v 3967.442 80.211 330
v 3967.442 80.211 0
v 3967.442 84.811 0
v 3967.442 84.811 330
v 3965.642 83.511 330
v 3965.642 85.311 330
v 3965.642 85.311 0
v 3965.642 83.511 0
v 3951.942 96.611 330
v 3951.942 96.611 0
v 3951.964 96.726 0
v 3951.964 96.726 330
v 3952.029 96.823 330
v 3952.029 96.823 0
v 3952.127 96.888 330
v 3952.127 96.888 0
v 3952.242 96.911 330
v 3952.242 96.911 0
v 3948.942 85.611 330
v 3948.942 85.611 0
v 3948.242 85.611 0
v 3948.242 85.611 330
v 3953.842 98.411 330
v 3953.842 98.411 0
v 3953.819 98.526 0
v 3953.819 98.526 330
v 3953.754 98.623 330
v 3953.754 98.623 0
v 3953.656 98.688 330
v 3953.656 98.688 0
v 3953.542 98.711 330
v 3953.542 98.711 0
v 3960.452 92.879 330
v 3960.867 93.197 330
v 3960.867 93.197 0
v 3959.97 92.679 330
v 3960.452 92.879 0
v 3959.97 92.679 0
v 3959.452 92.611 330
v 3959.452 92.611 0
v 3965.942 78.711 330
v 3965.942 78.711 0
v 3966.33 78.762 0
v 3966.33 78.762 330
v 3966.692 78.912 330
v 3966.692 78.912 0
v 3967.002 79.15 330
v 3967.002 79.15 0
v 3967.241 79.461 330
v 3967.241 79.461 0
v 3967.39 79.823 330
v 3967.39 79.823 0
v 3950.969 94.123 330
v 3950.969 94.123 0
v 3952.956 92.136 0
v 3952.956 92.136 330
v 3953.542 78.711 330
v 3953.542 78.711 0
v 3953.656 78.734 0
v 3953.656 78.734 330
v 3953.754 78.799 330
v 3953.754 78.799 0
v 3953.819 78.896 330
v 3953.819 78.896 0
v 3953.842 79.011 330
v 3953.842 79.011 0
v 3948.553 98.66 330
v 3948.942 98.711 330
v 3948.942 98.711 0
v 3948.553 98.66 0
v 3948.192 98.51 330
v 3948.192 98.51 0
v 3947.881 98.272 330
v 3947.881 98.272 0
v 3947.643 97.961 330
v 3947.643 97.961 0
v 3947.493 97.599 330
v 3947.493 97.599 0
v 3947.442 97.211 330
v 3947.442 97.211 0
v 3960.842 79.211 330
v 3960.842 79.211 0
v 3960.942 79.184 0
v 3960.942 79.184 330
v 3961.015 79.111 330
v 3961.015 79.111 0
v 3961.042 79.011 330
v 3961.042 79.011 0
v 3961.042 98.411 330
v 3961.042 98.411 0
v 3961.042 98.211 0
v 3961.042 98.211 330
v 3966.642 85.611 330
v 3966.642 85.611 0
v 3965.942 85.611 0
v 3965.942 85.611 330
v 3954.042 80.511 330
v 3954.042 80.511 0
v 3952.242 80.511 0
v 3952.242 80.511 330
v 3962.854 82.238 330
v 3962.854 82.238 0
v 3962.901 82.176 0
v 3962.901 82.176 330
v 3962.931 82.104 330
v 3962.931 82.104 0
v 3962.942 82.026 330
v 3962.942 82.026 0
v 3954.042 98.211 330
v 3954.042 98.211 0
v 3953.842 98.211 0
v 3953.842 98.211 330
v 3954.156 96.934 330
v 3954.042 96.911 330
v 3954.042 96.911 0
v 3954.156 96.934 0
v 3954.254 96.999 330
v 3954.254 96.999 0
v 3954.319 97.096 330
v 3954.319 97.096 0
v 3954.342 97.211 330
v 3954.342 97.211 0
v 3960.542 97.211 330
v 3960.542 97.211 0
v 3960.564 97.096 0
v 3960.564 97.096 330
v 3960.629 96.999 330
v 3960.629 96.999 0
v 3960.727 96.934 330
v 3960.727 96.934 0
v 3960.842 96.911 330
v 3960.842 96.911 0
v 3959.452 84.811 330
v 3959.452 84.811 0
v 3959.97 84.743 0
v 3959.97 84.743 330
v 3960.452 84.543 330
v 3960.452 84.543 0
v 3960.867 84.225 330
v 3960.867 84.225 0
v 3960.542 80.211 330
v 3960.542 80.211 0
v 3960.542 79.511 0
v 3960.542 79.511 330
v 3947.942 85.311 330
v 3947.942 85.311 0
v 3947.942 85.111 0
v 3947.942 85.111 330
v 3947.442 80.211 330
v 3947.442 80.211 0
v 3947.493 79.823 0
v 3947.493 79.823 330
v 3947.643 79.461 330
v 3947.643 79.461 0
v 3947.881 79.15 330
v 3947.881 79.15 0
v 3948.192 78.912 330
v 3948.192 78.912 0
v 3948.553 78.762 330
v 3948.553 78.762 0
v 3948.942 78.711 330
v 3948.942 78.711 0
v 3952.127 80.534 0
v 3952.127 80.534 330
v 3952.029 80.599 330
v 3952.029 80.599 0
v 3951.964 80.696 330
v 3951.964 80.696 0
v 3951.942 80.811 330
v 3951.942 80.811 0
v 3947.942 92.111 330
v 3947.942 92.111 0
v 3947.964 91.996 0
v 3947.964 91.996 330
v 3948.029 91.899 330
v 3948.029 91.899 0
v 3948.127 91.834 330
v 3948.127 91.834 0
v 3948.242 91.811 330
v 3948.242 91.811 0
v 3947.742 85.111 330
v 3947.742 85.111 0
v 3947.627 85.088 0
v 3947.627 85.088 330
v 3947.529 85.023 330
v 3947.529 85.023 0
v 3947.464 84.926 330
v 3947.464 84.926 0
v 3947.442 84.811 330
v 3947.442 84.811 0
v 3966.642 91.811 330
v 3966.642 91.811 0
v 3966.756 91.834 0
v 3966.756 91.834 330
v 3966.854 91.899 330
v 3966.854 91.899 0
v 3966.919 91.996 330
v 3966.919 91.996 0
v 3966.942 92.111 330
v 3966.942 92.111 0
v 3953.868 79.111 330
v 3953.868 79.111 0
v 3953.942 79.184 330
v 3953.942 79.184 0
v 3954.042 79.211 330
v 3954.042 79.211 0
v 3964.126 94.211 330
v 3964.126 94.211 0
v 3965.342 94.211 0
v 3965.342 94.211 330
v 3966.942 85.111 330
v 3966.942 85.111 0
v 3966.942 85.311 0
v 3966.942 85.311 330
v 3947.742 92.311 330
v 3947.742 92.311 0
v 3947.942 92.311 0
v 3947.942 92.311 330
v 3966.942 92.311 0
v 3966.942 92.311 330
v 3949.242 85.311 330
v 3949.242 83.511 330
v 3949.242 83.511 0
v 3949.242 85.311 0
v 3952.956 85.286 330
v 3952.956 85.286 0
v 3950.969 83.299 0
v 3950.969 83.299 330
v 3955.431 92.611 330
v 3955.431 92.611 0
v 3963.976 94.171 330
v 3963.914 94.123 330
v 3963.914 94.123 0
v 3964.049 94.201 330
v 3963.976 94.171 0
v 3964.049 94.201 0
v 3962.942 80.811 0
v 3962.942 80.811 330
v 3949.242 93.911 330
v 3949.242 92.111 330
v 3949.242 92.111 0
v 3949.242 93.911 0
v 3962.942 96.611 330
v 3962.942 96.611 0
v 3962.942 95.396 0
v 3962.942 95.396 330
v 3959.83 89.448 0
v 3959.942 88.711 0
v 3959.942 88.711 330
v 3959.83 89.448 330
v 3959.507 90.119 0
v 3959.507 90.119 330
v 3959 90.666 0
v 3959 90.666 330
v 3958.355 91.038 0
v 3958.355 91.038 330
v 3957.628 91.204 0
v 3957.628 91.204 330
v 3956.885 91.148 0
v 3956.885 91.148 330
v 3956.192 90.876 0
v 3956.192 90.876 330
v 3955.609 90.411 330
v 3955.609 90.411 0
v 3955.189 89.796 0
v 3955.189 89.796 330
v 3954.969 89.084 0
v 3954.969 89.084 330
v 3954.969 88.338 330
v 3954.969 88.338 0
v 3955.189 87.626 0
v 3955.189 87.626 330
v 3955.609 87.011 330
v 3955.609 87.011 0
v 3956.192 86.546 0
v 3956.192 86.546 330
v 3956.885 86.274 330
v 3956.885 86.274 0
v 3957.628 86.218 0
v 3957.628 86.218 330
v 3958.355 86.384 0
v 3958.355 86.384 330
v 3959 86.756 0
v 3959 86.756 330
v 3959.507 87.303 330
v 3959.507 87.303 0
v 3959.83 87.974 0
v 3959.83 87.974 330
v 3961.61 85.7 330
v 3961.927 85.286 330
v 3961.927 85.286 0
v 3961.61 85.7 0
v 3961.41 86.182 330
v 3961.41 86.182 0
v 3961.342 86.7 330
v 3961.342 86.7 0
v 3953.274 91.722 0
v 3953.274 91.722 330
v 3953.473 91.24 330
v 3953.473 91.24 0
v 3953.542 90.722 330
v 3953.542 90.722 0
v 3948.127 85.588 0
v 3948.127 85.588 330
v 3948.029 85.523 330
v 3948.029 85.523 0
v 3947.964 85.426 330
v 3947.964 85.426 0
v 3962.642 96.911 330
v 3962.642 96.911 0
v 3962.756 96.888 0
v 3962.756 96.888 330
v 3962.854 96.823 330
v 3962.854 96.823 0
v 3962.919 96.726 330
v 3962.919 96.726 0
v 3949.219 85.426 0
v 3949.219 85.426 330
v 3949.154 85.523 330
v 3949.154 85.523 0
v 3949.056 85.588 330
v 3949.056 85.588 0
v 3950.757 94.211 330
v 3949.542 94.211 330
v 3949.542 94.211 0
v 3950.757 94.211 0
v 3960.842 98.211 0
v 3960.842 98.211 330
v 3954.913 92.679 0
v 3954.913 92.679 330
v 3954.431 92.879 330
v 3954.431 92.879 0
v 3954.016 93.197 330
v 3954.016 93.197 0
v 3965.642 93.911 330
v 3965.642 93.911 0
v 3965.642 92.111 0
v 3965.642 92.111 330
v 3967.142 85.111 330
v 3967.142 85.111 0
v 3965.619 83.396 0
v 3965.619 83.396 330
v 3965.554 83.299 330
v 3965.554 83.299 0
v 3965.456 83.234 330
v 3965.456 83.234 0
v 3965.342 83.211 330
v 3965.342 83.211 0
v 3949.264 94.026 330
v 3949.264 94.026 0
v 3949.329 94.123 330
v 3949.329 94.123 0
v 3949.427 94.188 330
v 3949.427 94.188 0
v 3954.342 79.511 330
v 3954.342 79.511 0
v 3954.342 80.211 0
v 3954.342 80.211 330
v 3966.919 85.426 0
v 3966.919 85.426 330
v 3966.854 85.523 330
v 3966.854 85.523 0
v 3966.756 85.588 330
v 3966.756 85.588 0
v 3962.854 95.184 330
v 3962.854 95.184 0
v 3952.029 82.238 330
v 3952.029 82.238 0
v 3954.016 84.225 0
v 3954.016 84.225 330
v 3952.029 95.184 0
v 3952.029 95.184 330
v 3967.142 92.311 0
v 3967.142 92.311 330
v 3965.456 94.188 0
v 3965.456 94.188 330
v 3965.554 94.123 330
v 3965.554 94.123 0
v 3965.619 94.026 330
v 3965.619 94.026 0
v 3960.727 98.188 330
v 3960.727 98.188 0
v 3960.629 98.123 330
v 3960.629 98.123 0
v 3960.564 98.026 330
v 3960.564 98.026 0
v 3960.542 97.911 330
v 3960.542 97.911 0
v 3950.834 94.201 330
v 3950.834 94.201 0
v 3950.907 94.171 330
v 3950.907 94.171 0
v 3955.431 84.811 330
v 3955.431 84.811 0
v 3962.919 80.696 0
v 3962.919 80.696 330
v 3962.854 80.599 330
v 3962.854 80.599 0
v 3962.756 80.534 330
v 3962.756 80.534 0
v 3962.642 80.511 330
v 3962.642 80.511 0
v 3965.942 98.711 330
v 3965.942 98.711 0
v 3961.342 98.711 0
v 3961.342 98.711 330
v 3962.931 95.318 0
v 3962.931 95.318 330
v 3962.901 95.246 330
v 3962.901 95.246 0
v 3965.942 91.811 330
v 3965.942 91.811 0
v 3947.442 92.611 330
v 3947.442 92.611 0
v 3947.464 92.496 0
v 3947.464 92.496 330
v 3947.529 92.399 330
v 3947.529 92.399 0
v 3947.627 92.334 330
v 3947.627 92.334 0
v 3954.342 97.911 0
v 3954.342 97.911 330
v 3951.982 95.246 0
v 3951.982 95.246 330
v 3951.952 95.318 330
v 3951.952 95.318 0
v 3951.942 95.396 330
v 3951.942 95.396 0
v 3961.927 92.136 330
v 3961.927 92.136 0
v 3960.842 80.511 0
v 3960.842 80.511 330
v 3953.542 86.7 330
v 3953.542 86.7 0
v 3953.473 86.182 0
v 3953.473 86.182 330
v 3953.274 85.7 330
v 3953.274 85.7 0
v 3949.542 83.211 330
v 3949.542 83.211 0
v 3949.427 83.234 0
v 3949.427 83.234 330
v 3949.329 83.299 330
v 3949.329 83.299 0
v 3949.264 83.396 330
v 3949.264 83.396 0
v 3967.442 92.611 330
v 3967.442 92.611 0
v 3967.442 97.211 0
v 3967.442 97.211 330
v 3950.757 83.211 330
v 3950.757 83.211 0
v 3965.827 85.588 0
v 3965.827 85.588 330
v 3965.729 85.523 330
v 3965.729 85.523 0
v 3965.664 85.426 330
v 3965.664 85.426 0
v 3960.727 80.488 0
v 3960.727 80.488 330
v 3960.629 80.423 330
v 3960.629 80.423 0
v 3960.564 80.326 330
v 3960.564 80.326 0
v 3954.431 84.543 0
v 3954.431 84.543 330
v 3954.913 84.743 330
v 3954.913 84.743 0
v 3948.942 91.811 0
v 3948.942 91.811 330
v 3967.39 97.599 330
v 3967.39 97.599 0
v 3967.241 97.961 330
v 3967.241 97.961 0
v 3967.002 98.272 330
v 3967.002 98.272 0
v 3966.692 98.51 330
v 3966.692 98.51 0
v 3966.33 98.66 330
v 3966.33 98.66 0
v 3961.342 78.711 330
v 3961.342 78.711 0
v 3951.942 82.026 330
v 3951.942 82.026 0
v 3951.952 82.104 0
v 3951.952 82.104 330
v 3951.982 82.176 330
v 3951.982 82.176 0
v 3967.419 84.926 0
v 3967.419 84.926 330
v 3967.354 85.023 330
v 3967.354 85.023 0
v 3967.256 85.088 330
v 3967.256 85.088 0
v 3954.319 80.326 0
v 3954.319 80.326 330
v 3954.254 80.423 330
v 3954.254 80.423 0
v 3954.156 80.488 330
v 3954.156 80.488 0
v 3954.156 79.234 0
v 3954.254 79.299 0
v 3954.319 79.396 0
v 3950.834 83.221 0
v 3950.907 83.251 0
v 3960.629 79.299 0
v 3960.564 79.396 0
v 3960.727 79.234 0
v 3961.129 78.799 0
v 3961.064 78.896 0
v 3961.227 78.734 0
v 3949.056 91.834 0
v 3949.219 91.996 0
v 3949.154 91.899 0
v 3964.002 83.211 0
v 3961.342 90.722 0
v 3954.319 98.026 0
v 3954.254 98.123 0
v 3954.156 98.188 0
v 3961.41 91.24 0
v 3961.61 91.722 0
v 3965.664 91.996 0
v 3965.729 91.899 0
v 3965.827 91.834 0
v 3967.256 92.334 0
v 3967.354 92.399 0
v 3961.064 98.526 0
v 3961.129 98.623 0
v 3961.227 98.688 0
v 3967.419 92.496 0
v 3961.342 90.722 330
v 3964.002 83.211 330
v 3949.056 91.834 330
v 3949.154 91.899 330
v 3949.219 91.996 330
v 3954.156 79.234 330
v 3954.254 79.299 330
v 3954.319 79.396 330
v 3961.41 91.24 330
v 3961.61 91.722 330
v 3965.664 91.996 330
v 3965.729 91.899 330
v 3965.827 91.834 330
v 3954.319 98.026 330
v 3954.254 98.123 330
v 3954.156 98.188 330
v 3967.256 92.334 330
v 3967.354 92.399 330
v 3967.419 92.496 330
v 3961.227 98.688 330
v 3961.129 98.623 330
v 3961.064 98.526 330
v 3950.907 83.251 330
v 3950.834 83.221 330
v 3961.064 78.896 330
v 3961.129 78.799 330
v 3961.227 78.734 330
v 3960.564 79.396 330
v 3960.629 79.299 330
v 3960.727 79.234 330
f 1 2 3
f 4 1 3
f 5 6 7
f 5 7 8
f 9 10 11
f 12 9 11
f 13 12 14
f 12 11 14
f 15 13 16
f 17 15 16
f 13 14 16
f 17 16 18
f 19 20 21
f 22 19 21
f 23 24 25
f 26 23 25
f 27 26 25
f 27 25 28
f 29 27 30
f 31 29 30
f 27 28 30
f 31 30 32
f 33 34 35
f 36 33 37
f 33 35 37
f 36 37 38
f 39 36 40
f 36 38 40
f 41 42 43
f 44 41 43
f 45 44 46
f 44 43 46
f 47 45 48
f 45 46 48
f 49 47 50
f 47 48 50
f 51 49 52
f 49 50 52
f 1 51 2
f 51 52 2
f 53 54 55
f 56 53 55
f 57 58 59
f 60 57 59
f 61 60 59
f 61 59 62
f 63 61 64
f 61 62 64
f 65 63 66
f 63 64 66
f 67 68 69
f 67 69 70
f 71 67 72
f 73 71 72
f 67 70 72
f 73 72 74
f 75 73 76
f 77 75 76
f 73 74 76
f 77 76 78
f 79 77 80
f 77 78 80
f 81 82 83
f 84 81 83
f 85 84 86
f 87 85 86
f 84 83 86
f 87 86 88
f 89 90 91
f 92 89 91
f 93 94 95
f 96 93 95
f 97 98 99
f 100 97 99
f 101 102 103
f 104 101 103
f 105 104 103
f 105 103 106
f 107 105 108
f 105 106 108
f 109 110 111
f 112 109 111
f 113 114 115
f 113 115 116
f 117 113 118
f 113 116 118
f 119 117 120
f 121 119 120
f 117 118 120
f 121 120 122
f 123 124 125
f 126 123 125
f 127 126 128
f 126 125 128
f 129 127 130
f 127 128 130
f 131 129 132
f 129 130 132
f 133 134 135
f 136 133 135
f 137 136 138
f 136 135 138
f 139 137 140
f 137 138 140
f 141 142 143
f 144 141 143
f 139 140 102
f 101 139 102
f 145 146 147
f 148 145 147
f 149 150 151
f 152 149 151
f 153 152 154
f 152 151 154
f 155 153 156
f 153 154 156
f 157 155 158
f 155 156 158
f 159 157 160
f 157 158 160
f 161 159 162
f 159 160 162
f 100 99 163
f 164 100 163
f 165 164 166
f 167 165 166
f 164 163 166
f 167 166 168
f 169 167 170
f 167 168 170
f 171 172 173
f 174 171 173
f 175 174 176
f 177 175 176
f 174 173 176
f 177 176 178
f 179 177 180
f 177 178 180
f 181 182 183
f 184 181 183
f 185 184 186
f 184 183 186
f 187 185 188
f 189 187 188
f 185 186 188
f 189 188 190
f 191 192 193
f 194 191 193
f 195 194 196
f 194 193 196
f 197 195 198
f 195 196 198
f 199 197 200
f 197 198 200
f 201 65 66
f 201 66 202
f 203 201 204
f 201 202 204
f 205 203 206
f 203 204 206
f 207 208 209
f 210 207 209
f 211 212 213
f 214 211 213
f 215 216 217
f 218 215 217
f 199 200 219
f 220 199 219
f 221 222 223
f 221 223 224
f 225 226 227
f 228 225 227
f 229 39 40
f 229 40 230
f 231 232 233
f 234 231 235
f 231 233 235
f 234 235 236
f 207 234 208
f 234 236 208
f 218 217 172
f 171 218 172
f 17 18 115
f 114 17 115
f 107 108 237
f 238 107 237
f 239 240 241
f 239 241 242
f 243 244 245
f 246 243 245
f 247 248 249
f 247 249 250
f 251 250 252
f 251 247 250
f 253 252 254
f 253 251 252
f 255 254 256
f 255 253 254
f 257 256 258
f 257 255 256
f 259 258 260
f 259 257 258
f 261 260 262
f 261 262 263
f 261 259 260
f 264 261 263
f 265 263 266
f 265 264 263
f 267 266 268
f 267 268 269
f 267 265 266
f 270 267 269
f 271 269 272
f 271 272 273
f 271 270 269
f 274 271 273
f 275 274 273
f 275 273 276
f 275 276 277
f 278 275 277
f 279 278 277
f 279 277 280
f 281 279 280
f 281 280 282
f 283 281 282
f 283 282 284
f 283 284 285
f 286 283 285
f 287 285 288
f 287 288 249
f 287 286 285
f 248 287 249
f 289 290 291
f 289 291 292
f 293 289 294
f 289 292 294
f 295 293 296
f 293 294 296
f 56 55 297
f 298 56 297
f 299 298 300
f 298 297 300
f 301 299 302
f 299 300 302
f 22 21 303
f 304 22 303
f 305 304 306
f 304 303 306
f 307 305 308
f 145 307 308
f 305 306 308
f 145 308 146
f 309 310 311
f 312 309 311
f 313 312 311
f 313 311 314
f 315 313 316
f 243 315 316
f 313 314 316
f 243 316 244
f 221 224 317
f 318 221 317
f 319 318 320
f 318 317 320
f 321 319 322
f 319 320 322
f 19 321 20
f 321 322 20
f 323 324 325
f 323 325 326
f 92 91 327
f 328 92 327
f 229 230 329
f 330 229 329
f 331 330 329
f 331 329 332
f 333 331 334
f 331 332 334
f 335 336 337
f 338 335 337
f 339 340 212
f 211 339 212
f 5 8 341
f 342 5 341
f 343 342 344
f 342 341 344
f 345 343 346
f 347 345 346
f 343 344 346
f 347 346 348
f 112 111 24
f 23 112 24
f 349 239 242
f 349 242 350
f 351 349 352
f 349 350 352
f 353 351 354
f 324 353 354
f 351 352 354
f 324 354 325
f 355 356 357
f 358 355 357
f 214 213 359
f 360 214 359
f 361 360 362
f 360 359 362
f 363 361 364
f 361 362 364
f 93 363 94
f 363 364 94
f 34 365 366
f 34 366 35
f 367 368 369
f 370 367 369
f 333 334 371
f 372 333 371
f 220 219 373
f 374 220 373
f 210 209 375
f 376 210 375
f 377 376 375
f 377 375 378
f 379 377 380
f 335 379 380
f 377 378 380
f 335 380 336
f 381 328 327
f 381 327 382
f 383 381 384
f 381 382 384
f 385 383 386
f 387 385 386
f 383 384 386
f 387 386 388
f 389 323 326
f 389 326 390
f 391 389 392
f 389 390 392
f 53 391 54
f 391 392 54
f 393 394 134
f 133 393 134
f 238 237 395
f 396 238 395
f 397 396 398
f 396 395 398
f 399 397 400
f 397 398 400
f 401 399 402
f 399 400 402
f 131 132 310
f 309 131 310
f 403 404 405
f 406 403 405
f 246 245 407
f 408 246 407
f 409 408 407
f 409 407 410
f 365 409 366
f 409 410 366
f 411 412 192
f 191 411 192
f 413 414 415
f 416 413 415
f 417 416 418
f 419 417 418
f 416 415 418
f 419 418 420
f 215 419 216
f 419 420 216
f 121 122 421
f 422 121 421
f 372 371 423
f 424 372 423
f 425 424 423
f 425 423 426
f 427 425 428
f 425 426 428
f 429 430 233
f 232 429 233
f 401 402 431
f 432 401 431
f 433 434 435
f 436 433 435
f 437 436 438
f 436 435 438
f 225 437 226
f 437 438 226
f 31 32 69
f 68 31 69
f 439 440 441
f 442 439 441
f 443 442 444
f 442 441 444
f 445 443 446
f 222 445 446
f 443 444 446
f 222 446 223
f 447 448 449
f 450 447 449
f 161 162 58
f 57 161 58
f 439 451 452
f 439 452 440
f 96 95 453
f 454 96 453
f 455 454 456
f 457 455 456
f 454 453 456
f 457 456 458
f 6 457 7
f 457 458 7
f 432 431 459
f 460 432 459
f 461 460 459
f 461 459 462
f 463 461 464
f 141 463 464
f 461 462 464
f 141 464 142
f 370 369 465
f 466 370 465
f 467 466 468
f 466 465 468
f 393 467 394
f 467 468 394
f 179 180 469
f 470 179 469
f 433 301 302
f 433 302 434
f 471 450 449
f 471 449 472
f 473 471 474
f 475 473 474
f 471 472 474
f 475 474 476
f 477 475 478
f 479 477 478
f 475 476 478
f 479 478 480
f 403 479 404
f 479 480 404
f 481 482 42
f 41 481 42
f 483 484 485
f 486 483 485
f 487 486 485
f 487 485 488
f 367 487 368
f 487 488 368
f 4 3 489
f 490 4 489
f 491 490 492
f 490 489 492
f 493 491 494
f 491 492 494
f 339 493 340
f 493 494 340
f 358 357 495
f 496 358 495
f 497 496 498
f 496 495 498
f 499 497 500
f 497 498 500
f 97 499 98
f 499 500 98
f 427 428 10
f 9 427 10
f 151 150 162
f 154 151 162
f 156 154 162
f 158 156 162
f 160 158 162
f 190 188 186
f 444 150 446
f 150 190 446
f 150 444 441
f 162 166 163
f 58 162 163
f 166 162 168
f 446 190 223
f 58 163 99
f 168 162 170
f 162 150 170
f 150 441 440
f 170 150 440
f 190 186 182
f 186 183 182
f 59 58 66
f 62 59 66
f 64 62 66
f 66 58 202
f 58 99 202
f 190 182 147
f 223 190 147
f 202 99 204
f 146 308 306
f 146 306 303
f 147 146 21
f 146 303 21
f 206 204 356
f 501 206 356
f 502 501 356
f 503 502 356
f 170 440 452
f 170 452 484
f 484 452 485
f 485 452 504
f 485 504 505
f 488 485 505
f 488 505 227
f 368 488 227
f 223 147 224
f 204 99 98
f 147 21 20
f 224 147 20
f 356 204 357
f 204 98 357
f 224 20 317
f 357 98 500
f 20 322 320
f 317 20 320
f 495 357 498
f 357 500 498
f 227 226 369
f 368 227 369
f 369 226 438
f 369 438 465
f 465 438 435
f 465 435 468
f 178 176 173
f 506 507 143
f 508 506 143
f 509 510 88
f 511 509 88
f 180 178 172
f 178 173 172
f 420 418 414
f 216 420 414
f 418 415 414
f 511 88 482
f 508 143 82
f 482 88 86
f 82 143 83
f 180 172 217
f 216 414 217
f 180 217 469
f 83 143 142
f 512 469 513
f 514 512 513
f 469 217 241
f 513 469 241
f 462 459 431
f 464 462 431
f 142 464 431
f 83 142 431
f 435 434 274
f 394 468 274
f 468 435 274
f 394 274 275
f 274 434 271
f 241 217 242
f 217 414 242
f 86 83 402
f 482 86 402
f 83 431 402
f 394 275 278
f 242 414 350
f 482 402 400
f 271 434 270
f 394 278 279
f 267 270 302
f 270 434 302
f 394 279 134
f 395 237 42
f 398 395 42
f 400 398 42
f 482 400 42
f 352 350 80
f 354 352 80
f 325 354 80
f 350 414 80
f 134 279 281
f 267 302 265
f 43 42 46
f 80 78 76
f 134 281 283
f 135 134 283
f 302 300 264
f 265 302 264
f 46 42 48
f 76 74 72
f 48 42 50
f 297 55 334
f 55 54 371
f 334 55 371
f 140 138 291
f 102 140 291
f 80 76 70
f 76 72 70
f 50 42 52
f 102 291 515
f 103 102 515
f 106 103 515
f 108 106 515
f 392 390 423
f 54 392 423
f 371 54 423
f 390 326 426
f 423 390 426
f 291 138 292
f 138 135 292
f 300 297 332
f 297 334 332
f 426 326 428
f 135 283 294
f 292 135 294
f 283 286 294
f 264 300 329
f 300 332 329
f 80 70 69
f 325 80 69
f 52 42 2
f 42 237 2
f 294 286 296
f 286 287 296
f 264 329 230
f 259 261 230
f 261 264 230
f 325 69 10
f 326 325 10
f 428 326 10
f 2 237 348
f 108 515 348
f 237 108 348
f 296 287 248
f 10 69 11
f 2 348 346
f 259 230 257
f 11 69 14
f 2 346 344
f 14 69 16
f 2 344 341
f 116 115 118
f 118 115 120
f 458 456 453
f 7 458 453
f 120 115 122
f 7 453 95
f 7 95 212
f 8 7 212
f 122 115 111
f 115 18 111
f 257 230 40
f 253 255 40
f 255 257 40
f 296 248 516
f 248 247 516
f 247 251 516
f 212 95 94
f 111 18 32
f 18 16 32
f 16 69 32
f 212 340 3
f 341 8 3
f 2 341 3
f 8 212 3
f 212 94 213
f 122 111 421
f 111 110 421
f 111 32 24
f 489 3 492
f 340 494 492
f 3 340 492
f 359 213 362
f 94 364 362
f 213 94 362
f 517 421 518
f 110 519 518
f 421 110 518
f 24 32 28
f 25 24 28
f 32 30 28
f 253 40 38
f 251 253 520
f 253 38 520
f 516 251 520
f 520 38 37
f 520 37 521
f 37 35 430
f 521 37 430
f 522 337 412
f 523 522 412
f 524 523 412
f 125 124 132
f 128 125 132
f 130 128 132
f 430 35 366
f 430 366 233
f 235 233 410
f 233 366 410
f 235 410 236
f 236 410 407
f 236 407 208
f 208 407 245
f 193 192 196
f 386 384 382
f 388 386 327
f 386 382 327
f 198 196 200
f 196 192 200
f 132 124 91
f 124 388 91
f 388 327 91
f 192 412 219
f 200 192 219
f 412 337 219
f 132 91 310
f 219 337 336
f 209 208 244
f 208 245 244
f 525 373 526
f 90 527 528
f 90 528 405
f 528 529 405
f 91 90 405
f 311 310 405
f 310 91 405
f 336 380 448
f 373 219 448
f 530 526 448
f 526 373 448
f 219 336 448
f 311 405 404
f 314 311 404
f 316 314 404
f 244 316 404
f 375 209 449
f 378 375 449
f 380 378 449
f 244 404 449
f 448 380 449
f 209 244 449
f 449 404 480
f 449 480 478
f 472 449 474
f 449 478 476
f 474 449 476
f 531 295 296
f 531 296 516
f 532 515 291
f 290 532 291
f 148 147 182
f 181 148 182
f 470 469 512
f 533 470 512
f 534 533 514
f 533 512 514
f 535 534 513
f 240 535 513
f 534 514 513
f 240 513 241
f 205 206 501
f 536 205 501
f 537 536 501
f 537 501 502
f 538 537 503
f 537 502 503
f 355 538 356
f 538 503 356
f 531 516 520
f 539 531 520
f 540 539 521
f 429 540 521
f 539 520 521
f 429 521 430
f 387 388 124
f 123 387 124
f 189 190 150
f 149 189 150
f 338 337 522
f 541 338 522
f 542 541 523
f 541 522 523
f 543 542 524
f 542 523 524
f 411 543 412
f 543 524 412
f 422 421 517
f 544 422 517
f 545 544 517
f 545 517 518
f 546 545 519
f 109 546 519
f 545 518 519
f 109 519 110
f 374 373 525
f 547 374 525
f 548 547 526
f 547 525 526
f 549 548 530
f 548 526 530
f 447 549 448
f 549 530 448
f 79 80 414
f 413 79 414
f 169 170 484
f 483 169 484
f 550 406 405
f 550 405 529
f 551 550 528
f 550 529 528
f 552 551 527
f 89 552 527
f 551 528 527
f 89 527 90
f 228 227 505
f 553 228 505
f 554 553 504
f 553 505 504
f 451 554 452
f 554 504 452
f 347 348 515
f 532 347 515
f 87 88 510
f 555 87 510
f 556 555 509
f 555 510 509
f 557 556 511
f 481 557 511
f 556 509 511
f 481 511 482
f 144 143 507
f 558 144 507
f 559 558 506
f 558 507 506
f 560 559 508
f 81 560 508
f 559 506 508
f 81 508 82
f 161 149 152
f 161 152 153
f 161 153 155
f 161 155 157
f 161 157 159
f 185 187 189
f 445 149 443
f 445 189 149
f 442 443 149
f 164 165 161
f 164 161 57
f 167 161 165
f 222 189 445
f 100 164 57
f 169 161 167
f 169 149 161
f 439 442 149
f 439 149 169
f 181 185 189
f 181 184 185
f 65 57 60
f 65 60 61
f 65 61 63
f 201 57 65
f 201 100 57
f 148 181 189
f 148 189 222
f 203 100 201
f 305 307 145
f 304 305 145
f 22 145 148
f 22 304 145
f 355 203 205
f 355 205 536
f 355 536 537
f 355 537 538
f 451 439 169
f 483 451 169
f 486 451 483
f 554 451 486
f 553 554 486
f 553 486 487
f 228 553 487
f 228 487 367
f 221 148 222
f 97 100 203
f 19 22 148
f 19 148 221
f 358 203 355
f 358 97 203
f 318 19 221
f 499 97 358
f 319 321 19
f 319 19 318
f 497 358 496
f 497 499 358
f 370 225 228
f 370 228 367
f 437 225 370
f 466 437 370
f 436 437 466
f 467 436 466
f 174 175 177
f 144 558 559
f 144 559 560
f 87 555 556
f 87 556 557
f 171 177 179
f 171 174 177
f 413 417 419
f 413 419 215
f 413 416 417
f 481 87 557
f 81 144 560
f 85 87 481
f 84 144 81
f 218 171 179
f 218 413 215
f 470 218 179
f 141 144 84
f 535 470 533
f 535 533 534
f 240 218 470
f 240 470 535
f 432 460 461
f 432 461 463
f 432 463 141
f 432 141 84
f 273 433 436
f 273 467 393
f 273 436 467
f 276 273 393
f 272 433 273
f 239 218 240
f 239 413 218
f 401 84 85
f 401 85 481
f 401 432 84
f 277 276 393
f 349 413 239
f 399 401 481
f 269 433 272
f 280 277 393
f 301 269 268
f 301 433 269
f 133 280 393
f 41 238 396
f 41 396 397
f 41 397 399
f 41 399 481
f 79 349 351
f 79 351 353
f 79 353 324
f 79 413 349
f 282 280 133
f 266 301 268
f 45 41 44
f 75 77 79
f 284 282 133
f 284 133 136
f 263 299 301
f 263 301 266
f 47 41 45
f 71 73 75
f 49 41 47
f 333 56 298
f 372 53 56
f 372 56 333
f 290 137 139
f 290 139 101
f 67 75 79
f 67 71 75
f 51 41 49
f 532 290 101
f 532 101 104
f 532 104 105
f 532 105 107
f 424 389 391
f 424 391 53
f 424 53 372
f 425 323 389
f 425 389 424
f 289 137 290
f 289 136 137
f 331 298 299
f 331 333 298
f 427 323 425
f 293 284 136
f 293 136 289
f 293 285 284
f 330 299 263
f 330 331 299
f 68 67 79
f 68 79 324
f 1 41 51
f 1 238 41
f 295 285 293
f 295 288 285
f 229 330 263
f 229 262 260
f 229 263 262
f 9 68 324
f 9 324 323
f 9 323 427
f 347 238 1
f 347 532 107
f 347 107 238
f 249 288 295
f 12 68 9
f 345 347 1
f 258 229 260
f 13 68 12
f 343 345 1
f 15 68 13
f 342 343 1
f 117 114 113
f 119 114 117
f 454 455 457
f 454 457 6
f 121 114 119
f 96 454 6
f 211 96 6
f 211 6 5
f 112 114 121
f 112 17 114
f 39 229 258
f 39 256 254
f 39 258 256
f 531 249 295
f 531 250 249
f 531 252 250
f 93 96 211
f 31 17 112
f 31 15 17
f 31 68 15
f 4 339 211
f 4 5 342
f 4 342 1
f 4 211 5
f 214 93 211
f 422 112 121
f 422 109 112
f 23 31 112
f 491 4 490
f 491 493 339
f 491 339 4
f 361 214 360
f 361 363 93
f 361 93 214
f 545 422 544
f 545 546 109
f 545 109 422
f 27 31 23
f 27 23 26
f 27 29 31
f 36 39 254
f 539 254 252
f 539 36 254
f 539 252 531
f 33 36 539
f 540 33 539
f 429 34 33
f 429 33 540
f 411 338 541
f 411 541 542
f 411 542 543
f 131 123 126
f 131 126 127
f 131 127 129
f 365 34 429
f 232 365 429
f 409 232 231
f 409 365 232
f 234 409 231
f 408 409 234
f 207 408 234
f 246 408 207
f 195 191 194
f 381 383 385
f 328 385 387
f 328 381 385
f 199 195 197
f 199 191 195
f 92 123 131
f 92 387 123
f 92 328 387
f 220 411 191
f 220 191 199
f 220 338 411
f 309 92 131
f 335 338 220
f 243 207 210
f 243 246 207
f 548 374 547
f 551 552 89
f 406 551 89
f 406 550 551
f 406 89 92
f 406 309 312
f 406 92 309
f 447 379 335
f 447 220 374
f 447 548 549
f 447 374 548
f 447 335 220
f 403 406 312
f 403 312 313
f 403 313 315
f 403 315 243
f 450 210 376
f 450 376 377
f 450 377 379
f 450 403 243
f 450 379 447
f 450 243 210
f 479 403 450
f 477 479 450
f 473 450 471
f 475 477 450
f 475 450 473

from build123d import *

# Parameters (mm, degrees)
SKETCH_191_R    = 2.5
EXTRUDE_1_DEPTH = 330


with BuildPart() as part:
    # Sketch 191 → 凸台-拉伸1 (new body)
    with BuildSketch(Plane.XY):
        with BuildLine():
            Line((3961.92734864, 92.136143898), (3963.914354409, 94.123149666))
            ThreePointArc((3963.914354409, 94.123149666), (3964.011681414, 94.188181491), (3964.126486443, 94.211017632))
            Line((3964.126486443, 94.211017632), (3965.341562203, 94.211017632))
            ThreePointArc((3965.341562203, 94.211017632), (3965.553694237, 94.123149666), (3965.641562203, 93.911017632))
            Line((3965.641562203, 93.911017632), (3965.641562203, 92.111017631))
            ThreePointArc((3965.641562203, 92.111017631), (3965.729430168, 91.898885597), (3965.941562203, 91.811017632))
            Line((3965.941562203, 91.811017632), (3966.641562203, 91.811017632))
            ThreePointArc((3966.641562203, 91.811017632), (3966.853694237, 91.898885597), (3966.941562203, 92.111017632))
            Line((3966.941562203, 92.111017632), (3966.941562203, 92.311017632))
            Line((3966.941562203, 92.311017632), (3967.141562203, 92.311017632))
            ThreePointArc((3967.141562203, 92.311017632), (3967.353694237, 92.398885597), (3967.441562203, 92.611017632))
            Line((3967.441562203, 92.611017632), (3967.441562203, 97.211017632))
            ThreePointArc((3967.441562203, 97.211017632), (3967.002222375, 98.271677803), (3965.941562203, 98.711017632))
            Line((3965.941562203, 98.711017632), (3961.341562203, 98.711017632))
            ThreePointArc((3961.341562203, 98.711017632), (3961.129430168, 98.623149666), (3961.041562203, 98.411017632))
            Line((3961.041562203, 98.411017632), (3961.041562203, 98.211017632))
            Line((3961.041562203, 98.211017632), (3960.841562203, 98.211017632))
            ThreePointArc((3960.841562203, 98.211017632), (3960.629430168, 98.123149666), (3960.541562203, 97.911017632))
            Line((3960.541562203, 97.911017632), (3960.541562203, 97.211017631))
            ThreePointArc((3960.541562203, 97.211017631), (3960.629430168, 96.998885597), (3960.841562203, 96.911017632))
            Line((3960.841562203, 96.911017632), (3962.641562203, 96.911017632))
            ThreePointArc((3962.641562203, 96.911017632), (3962.853694237, 96.823149666), (3962.941562203, 96.611017632))
            Line((3962.941562203, 96.611017632), (3962.941562203, 95.395941872))
            ThreePointArc((3962.941562203, 95.395941872), (3962.918726063, 95.281136842), (3962.853694237, 95.183809838))
            Line((3962.853694237, 95.183809838), (3960.866688469, 93.196804069))
            ThreePointArc((3960.866688469, 93.196804069), (3960.217841771, 92.763258567), (3959.452474906, 92.611017632))
            Line((3959.452474906, 92.611017632), (3955.430649499, 92.611017632))
            ThreePointArc((3955.430649499, 92.611017632), (3954.665282635, 92.763258567), (3954.016435937, 93.196804069))
            Line((3954.016435937, 93.196804069), (3952.029430168, 95.183809838))
            ThreePointArc((3952.029430168, 95.183809838), (3951.964398343, 95.281136842), (3951.941562203, 95.395941872))
            Line((3951.941562203, 95.395941872), (3951.941562203, 96.611017632))
            ThreePointArc((3951.941562203, 96.611017632), (3952.029430168, 96.823149666), (3952.241562203, 96.911017632))
            Line((3952.241562203, 96.911017632), (3954.041562203, 96.911017632))
            ThreePointArc((3954.041562203, 96.911017632), (3954.253694237, 96.998885597), (3954.341562203, 97.211017631))
            Line((3954.341562203, 97.211017631), (3954.341562203, 97.911017632))
            ThreePointArc((3954.341562203, 97.911017632), (3954.253694237, 98.123149666), (3954.041562203, 98.211017632))
            Line((3954.041562203, 98.211017632), (3953.841562203, 98.211017632))
            Line((3953.841562203, 98.211017632), (3953.841562203, 98.411017632))
            ThreePointArc((3953.841562203, 98.411017632), (3953.753694237, 98.623149666), (3953.541562203, 98.711017632))
            Line((3953.541562203, 98.711017632), (3948.941562203, 98.711017632))
            ThreePointArc((3948.941562203, 98.711017632), (3947.880902031, 98.271677803), (3947.441562203, 97.211017632))
            Line((3947.441562203, 97.211017632), (3947.441562203, 92.611017632))
            ThreePointArc((3947.441562203, 92.611017632), (3947.529430168, 92.398885597), (3947.741562203, 92.311017632))
            Line((3947.741562203, 92.311017632), (3947.941562203, 92.311017632))
            Line((3947.941562203, 92.311017632), (3947.941562203, 92.111017632))
            ThreePointArc((3947.941562203, 92.111017632), (3948.029430168, 91.898885597), (3948.241562203, 91.811017632))
            Line((3948.241562203, 91.811017632), (3948.941562203, 91.811017632))
            ThreePointArc((3948.941562203, 91.811017632), (3949.153694237, 91.898885597), (3949.241562203, 92.111017632))
            Line((3949.241562203, 92.111017632), (3949.241562203, 93.911017632))
            ThreePointArc((3949.241562203, 93.911017632), (3949.329430168, 94.123149666), (3949.541562203, 94.211017632))
            Line((3949.541562203, 94.211017632), (3950.756637962, 94.211017632))
            ThreePointArc((3950.756637962, 94.211017632), (3950.871442992, 94.188181491), (3950.968769997, 94.123149666))
            Line((3950.968769997, 94.123149666), (3952.955775765, 92.136143898))
            ThreePointArc((3952.955775765, 92.136143898), (3953.389321268, 91.4872972), (3953.541562203, 90.721930335))
            Line((3953.541562203, 90.721930335), (3953.541562203, 86.700104928))
            ThreePointArc((3953.541562203, 86.700104928), (3953.389321268, 85.934738063), (3952.955775765, 85.285891366))
            Line((3952.955775765, 85.285891366), (3950.968769997, 83.298885597))
            ThreePointArc((3950.968769997, 83.298885597), (3950.871442992, 83.233853772), (3950.756637962, 83.211017632))
            Line((3950.756637962, 83.211017632), (3949.541562203, 83.211017632))
            ThreePointArc((3949.541562203, 83.211017632), (3949.329430168, 83.298885597), (3949.241562203, 83.511017632))
            Line((3949.241562203, 83.511017632), (3949.241562203, 85.311017632))
            ThreePointArc((3949.241562203, 85.311017632), (3949.153694237, 85.523149666), (3948.941562203, 85.611017632))
            Line((3948.941562203, 85.611017632), (3948.241562203, 85.611017632))
            ThreePointArc((3948.241562203, 85.611017632), (3948.029430168, 85.523149666), (3947.941562203, 85.311017632))
            Line((3947.941562203, 85.311017632), (3947.941562203, 85.111017632))
            Line((3947.941562203, 85.111017632), (3947.741562203, 85.111017632))
            ThreePointArc((3947.741562203, 85.111017632), (3947.529430168, 85.023149666), (3947.441562203, 84.811017632))
            Line((3947.441562203, 84.811017632), (3947.441562203, 80.211017632))
            ThreePointArc((3947.441562203, 80.211017632), (3947.880902031, 79.15035746), (3948.941562203, 78.711017632))
            Line((3948.941562203, 78.711017632), (3953.541562203, 78.711017632))
            ThreePointArc((3953.541562203, 78.711017632), (3953.753694237, 78.798885597), (3953.841562203, 79.011017632))
            ThreePointArc((3953.841562203, 79.011017632), (3953.900140847, 79.152438988), (3954.041562203, 79.211017632))
            ThreePointArc((3954.041562203, 79.211017632), (3954.253694237, 79.298885597), (3954.341562203, 79.511017632))
            Line((3954.341562203, 79.511017632), (3954.341562203, 80.211017632))
            ThreePointArc((3954.341562203, 80.211017632), (3954.253694237, 80.423149666), (3954.041562203, 80.511017632))
            Line((3954.041562203, 80.511017632), (3952.241562203, 80.511017632))
            ThreePointArc((3952.241562203, 80.511017632), (3952.029430168, 80.598885597), (3951.941562203, 80.811017632))
            Line((3951.941562203, 80.811017632), (3951.941562203, 82.026093391))
            ThreePointArc((3951.941562203, 82.026093391), (3951.964398343, 82.140898421), (3952.029430168, 82.238225425))
            Line((3952.029430168, 82.238225425), (3954.016435937, 84.225231194))
            ThreePointArc((3954.016435937, 84.225231194), (3954.665282635, 84.658776697), (3955.4306495, 84.811017632))
            Line((3955.4306495, 84.811017632), (3959.452474906, 84.811017632))
            ThreePointArc((3959.452474906, 84.811017632), (3960.217841771, 84.658776697), (3960.866688469, 84.225231194))
            Line((3960.866688469, 84.225231194), (3962.853694237, 82.238225425))
            ThreePointArc((3962.853694237, 82.238225425), (3962.918726063, 82.140898421), (3962.941562203, 82.026093391))
            Line((3962.941562203, 82.026093391), (3962.941562203, 80.811017632))
            ThreePointArc((3962.941562203, 80.811017632), (3962.853694237, 80.598885597), (3962.641562203, 80.511017632))
            Line((3962.641562203, 80.511017632), (3960.841562203, 80.511017632))
            ThreePointArc((3960.841562203, 80.511017632), (3960.629430168, 80.423149666), (3960.541562203, 80.211017632))
            Line((3960.541562203, 80.211017632), (3960.541562203, 79.511017632))
            ThreePointArc((3960.541562203, 79.511017632), (3960.629430168, 79.298885597), (3960.841562203, 79.211017632))
            ThreePointArc((3960.841562203, 79.211017632), (3960.982983559, 79.152438988), (3961.041562203, 79.011017632))
            ThreePointArc((3961.041562203, 79.011017632), (3961.129430168, 78.798885597), (3961.341562203, 78.711017632))
            Line((3961.341562203, 78.711017632), (3965.941562203, 78.711017632))
            ThreePointArc((3965.941562203, 78.711017632), (3967.002222375, 79.15035746), (3967.441562203, 80.211017632))
            Line((3967.441562203, 80.211017632), (3967.441562203, 84.811017632))
            ThreePointArc((3967.441562203, 84.811017632), (3967.353694237, 85.023149666), (3967.141562203, 85.111017632))
            Line((3967.141562203, 85.111017632), (3966.941562203, 85.111017632))
            Line((3966.941562203, 85.111017632), (3966.941562203, 85.311017632))
            ThreePointArc((3966.941562203, 85.311017632), (3966.853694237, 85.523149666), (3966.641562203, 85.611017632))
            Line((3966.641562203, 85.611017632), (3965.941562203, 85.611017632))
            ThreePointArc((3965.941562203, 85.611017632), (3965.729430168, 85.523149666), (3965.641562203, 85.311017632))
            Line((3965.641562203, 85.311017632), (3965.641562203, 83.511017632))
            ThreePointArc((3965.641562203, 83.511017632), (3965.553694237, 83.298885597), (3965.341562203, 83.211017632))
            Line((3965.341562203, 83.211017632), (3964.002222375, 83.211017632))
            Line((3964.002222375, 83.211017632), (3961.92734864, 85.285891366))
            ThreePointArc((3961.92734864, 85.285891366), (3961.493803138, 85.934738063), (3961.341562203, 86.700104928))
            Line((3961.341562203, 86.700104928), (3961.341562203, 90.721930335))
            ThreePointArc((3961.341562203, 90.721930335), (3961.493803138, 91.4872972), (3961.92734864, 92.136143898))
        make_face()
        with Locations((3957.441562203, 88.711017632)):
            Circle(SKETCH_191_R, mode=Mode.SUBTRACT)
    extrude(amount=EXTRUDE_1_DEPTH)


solid = part.part
